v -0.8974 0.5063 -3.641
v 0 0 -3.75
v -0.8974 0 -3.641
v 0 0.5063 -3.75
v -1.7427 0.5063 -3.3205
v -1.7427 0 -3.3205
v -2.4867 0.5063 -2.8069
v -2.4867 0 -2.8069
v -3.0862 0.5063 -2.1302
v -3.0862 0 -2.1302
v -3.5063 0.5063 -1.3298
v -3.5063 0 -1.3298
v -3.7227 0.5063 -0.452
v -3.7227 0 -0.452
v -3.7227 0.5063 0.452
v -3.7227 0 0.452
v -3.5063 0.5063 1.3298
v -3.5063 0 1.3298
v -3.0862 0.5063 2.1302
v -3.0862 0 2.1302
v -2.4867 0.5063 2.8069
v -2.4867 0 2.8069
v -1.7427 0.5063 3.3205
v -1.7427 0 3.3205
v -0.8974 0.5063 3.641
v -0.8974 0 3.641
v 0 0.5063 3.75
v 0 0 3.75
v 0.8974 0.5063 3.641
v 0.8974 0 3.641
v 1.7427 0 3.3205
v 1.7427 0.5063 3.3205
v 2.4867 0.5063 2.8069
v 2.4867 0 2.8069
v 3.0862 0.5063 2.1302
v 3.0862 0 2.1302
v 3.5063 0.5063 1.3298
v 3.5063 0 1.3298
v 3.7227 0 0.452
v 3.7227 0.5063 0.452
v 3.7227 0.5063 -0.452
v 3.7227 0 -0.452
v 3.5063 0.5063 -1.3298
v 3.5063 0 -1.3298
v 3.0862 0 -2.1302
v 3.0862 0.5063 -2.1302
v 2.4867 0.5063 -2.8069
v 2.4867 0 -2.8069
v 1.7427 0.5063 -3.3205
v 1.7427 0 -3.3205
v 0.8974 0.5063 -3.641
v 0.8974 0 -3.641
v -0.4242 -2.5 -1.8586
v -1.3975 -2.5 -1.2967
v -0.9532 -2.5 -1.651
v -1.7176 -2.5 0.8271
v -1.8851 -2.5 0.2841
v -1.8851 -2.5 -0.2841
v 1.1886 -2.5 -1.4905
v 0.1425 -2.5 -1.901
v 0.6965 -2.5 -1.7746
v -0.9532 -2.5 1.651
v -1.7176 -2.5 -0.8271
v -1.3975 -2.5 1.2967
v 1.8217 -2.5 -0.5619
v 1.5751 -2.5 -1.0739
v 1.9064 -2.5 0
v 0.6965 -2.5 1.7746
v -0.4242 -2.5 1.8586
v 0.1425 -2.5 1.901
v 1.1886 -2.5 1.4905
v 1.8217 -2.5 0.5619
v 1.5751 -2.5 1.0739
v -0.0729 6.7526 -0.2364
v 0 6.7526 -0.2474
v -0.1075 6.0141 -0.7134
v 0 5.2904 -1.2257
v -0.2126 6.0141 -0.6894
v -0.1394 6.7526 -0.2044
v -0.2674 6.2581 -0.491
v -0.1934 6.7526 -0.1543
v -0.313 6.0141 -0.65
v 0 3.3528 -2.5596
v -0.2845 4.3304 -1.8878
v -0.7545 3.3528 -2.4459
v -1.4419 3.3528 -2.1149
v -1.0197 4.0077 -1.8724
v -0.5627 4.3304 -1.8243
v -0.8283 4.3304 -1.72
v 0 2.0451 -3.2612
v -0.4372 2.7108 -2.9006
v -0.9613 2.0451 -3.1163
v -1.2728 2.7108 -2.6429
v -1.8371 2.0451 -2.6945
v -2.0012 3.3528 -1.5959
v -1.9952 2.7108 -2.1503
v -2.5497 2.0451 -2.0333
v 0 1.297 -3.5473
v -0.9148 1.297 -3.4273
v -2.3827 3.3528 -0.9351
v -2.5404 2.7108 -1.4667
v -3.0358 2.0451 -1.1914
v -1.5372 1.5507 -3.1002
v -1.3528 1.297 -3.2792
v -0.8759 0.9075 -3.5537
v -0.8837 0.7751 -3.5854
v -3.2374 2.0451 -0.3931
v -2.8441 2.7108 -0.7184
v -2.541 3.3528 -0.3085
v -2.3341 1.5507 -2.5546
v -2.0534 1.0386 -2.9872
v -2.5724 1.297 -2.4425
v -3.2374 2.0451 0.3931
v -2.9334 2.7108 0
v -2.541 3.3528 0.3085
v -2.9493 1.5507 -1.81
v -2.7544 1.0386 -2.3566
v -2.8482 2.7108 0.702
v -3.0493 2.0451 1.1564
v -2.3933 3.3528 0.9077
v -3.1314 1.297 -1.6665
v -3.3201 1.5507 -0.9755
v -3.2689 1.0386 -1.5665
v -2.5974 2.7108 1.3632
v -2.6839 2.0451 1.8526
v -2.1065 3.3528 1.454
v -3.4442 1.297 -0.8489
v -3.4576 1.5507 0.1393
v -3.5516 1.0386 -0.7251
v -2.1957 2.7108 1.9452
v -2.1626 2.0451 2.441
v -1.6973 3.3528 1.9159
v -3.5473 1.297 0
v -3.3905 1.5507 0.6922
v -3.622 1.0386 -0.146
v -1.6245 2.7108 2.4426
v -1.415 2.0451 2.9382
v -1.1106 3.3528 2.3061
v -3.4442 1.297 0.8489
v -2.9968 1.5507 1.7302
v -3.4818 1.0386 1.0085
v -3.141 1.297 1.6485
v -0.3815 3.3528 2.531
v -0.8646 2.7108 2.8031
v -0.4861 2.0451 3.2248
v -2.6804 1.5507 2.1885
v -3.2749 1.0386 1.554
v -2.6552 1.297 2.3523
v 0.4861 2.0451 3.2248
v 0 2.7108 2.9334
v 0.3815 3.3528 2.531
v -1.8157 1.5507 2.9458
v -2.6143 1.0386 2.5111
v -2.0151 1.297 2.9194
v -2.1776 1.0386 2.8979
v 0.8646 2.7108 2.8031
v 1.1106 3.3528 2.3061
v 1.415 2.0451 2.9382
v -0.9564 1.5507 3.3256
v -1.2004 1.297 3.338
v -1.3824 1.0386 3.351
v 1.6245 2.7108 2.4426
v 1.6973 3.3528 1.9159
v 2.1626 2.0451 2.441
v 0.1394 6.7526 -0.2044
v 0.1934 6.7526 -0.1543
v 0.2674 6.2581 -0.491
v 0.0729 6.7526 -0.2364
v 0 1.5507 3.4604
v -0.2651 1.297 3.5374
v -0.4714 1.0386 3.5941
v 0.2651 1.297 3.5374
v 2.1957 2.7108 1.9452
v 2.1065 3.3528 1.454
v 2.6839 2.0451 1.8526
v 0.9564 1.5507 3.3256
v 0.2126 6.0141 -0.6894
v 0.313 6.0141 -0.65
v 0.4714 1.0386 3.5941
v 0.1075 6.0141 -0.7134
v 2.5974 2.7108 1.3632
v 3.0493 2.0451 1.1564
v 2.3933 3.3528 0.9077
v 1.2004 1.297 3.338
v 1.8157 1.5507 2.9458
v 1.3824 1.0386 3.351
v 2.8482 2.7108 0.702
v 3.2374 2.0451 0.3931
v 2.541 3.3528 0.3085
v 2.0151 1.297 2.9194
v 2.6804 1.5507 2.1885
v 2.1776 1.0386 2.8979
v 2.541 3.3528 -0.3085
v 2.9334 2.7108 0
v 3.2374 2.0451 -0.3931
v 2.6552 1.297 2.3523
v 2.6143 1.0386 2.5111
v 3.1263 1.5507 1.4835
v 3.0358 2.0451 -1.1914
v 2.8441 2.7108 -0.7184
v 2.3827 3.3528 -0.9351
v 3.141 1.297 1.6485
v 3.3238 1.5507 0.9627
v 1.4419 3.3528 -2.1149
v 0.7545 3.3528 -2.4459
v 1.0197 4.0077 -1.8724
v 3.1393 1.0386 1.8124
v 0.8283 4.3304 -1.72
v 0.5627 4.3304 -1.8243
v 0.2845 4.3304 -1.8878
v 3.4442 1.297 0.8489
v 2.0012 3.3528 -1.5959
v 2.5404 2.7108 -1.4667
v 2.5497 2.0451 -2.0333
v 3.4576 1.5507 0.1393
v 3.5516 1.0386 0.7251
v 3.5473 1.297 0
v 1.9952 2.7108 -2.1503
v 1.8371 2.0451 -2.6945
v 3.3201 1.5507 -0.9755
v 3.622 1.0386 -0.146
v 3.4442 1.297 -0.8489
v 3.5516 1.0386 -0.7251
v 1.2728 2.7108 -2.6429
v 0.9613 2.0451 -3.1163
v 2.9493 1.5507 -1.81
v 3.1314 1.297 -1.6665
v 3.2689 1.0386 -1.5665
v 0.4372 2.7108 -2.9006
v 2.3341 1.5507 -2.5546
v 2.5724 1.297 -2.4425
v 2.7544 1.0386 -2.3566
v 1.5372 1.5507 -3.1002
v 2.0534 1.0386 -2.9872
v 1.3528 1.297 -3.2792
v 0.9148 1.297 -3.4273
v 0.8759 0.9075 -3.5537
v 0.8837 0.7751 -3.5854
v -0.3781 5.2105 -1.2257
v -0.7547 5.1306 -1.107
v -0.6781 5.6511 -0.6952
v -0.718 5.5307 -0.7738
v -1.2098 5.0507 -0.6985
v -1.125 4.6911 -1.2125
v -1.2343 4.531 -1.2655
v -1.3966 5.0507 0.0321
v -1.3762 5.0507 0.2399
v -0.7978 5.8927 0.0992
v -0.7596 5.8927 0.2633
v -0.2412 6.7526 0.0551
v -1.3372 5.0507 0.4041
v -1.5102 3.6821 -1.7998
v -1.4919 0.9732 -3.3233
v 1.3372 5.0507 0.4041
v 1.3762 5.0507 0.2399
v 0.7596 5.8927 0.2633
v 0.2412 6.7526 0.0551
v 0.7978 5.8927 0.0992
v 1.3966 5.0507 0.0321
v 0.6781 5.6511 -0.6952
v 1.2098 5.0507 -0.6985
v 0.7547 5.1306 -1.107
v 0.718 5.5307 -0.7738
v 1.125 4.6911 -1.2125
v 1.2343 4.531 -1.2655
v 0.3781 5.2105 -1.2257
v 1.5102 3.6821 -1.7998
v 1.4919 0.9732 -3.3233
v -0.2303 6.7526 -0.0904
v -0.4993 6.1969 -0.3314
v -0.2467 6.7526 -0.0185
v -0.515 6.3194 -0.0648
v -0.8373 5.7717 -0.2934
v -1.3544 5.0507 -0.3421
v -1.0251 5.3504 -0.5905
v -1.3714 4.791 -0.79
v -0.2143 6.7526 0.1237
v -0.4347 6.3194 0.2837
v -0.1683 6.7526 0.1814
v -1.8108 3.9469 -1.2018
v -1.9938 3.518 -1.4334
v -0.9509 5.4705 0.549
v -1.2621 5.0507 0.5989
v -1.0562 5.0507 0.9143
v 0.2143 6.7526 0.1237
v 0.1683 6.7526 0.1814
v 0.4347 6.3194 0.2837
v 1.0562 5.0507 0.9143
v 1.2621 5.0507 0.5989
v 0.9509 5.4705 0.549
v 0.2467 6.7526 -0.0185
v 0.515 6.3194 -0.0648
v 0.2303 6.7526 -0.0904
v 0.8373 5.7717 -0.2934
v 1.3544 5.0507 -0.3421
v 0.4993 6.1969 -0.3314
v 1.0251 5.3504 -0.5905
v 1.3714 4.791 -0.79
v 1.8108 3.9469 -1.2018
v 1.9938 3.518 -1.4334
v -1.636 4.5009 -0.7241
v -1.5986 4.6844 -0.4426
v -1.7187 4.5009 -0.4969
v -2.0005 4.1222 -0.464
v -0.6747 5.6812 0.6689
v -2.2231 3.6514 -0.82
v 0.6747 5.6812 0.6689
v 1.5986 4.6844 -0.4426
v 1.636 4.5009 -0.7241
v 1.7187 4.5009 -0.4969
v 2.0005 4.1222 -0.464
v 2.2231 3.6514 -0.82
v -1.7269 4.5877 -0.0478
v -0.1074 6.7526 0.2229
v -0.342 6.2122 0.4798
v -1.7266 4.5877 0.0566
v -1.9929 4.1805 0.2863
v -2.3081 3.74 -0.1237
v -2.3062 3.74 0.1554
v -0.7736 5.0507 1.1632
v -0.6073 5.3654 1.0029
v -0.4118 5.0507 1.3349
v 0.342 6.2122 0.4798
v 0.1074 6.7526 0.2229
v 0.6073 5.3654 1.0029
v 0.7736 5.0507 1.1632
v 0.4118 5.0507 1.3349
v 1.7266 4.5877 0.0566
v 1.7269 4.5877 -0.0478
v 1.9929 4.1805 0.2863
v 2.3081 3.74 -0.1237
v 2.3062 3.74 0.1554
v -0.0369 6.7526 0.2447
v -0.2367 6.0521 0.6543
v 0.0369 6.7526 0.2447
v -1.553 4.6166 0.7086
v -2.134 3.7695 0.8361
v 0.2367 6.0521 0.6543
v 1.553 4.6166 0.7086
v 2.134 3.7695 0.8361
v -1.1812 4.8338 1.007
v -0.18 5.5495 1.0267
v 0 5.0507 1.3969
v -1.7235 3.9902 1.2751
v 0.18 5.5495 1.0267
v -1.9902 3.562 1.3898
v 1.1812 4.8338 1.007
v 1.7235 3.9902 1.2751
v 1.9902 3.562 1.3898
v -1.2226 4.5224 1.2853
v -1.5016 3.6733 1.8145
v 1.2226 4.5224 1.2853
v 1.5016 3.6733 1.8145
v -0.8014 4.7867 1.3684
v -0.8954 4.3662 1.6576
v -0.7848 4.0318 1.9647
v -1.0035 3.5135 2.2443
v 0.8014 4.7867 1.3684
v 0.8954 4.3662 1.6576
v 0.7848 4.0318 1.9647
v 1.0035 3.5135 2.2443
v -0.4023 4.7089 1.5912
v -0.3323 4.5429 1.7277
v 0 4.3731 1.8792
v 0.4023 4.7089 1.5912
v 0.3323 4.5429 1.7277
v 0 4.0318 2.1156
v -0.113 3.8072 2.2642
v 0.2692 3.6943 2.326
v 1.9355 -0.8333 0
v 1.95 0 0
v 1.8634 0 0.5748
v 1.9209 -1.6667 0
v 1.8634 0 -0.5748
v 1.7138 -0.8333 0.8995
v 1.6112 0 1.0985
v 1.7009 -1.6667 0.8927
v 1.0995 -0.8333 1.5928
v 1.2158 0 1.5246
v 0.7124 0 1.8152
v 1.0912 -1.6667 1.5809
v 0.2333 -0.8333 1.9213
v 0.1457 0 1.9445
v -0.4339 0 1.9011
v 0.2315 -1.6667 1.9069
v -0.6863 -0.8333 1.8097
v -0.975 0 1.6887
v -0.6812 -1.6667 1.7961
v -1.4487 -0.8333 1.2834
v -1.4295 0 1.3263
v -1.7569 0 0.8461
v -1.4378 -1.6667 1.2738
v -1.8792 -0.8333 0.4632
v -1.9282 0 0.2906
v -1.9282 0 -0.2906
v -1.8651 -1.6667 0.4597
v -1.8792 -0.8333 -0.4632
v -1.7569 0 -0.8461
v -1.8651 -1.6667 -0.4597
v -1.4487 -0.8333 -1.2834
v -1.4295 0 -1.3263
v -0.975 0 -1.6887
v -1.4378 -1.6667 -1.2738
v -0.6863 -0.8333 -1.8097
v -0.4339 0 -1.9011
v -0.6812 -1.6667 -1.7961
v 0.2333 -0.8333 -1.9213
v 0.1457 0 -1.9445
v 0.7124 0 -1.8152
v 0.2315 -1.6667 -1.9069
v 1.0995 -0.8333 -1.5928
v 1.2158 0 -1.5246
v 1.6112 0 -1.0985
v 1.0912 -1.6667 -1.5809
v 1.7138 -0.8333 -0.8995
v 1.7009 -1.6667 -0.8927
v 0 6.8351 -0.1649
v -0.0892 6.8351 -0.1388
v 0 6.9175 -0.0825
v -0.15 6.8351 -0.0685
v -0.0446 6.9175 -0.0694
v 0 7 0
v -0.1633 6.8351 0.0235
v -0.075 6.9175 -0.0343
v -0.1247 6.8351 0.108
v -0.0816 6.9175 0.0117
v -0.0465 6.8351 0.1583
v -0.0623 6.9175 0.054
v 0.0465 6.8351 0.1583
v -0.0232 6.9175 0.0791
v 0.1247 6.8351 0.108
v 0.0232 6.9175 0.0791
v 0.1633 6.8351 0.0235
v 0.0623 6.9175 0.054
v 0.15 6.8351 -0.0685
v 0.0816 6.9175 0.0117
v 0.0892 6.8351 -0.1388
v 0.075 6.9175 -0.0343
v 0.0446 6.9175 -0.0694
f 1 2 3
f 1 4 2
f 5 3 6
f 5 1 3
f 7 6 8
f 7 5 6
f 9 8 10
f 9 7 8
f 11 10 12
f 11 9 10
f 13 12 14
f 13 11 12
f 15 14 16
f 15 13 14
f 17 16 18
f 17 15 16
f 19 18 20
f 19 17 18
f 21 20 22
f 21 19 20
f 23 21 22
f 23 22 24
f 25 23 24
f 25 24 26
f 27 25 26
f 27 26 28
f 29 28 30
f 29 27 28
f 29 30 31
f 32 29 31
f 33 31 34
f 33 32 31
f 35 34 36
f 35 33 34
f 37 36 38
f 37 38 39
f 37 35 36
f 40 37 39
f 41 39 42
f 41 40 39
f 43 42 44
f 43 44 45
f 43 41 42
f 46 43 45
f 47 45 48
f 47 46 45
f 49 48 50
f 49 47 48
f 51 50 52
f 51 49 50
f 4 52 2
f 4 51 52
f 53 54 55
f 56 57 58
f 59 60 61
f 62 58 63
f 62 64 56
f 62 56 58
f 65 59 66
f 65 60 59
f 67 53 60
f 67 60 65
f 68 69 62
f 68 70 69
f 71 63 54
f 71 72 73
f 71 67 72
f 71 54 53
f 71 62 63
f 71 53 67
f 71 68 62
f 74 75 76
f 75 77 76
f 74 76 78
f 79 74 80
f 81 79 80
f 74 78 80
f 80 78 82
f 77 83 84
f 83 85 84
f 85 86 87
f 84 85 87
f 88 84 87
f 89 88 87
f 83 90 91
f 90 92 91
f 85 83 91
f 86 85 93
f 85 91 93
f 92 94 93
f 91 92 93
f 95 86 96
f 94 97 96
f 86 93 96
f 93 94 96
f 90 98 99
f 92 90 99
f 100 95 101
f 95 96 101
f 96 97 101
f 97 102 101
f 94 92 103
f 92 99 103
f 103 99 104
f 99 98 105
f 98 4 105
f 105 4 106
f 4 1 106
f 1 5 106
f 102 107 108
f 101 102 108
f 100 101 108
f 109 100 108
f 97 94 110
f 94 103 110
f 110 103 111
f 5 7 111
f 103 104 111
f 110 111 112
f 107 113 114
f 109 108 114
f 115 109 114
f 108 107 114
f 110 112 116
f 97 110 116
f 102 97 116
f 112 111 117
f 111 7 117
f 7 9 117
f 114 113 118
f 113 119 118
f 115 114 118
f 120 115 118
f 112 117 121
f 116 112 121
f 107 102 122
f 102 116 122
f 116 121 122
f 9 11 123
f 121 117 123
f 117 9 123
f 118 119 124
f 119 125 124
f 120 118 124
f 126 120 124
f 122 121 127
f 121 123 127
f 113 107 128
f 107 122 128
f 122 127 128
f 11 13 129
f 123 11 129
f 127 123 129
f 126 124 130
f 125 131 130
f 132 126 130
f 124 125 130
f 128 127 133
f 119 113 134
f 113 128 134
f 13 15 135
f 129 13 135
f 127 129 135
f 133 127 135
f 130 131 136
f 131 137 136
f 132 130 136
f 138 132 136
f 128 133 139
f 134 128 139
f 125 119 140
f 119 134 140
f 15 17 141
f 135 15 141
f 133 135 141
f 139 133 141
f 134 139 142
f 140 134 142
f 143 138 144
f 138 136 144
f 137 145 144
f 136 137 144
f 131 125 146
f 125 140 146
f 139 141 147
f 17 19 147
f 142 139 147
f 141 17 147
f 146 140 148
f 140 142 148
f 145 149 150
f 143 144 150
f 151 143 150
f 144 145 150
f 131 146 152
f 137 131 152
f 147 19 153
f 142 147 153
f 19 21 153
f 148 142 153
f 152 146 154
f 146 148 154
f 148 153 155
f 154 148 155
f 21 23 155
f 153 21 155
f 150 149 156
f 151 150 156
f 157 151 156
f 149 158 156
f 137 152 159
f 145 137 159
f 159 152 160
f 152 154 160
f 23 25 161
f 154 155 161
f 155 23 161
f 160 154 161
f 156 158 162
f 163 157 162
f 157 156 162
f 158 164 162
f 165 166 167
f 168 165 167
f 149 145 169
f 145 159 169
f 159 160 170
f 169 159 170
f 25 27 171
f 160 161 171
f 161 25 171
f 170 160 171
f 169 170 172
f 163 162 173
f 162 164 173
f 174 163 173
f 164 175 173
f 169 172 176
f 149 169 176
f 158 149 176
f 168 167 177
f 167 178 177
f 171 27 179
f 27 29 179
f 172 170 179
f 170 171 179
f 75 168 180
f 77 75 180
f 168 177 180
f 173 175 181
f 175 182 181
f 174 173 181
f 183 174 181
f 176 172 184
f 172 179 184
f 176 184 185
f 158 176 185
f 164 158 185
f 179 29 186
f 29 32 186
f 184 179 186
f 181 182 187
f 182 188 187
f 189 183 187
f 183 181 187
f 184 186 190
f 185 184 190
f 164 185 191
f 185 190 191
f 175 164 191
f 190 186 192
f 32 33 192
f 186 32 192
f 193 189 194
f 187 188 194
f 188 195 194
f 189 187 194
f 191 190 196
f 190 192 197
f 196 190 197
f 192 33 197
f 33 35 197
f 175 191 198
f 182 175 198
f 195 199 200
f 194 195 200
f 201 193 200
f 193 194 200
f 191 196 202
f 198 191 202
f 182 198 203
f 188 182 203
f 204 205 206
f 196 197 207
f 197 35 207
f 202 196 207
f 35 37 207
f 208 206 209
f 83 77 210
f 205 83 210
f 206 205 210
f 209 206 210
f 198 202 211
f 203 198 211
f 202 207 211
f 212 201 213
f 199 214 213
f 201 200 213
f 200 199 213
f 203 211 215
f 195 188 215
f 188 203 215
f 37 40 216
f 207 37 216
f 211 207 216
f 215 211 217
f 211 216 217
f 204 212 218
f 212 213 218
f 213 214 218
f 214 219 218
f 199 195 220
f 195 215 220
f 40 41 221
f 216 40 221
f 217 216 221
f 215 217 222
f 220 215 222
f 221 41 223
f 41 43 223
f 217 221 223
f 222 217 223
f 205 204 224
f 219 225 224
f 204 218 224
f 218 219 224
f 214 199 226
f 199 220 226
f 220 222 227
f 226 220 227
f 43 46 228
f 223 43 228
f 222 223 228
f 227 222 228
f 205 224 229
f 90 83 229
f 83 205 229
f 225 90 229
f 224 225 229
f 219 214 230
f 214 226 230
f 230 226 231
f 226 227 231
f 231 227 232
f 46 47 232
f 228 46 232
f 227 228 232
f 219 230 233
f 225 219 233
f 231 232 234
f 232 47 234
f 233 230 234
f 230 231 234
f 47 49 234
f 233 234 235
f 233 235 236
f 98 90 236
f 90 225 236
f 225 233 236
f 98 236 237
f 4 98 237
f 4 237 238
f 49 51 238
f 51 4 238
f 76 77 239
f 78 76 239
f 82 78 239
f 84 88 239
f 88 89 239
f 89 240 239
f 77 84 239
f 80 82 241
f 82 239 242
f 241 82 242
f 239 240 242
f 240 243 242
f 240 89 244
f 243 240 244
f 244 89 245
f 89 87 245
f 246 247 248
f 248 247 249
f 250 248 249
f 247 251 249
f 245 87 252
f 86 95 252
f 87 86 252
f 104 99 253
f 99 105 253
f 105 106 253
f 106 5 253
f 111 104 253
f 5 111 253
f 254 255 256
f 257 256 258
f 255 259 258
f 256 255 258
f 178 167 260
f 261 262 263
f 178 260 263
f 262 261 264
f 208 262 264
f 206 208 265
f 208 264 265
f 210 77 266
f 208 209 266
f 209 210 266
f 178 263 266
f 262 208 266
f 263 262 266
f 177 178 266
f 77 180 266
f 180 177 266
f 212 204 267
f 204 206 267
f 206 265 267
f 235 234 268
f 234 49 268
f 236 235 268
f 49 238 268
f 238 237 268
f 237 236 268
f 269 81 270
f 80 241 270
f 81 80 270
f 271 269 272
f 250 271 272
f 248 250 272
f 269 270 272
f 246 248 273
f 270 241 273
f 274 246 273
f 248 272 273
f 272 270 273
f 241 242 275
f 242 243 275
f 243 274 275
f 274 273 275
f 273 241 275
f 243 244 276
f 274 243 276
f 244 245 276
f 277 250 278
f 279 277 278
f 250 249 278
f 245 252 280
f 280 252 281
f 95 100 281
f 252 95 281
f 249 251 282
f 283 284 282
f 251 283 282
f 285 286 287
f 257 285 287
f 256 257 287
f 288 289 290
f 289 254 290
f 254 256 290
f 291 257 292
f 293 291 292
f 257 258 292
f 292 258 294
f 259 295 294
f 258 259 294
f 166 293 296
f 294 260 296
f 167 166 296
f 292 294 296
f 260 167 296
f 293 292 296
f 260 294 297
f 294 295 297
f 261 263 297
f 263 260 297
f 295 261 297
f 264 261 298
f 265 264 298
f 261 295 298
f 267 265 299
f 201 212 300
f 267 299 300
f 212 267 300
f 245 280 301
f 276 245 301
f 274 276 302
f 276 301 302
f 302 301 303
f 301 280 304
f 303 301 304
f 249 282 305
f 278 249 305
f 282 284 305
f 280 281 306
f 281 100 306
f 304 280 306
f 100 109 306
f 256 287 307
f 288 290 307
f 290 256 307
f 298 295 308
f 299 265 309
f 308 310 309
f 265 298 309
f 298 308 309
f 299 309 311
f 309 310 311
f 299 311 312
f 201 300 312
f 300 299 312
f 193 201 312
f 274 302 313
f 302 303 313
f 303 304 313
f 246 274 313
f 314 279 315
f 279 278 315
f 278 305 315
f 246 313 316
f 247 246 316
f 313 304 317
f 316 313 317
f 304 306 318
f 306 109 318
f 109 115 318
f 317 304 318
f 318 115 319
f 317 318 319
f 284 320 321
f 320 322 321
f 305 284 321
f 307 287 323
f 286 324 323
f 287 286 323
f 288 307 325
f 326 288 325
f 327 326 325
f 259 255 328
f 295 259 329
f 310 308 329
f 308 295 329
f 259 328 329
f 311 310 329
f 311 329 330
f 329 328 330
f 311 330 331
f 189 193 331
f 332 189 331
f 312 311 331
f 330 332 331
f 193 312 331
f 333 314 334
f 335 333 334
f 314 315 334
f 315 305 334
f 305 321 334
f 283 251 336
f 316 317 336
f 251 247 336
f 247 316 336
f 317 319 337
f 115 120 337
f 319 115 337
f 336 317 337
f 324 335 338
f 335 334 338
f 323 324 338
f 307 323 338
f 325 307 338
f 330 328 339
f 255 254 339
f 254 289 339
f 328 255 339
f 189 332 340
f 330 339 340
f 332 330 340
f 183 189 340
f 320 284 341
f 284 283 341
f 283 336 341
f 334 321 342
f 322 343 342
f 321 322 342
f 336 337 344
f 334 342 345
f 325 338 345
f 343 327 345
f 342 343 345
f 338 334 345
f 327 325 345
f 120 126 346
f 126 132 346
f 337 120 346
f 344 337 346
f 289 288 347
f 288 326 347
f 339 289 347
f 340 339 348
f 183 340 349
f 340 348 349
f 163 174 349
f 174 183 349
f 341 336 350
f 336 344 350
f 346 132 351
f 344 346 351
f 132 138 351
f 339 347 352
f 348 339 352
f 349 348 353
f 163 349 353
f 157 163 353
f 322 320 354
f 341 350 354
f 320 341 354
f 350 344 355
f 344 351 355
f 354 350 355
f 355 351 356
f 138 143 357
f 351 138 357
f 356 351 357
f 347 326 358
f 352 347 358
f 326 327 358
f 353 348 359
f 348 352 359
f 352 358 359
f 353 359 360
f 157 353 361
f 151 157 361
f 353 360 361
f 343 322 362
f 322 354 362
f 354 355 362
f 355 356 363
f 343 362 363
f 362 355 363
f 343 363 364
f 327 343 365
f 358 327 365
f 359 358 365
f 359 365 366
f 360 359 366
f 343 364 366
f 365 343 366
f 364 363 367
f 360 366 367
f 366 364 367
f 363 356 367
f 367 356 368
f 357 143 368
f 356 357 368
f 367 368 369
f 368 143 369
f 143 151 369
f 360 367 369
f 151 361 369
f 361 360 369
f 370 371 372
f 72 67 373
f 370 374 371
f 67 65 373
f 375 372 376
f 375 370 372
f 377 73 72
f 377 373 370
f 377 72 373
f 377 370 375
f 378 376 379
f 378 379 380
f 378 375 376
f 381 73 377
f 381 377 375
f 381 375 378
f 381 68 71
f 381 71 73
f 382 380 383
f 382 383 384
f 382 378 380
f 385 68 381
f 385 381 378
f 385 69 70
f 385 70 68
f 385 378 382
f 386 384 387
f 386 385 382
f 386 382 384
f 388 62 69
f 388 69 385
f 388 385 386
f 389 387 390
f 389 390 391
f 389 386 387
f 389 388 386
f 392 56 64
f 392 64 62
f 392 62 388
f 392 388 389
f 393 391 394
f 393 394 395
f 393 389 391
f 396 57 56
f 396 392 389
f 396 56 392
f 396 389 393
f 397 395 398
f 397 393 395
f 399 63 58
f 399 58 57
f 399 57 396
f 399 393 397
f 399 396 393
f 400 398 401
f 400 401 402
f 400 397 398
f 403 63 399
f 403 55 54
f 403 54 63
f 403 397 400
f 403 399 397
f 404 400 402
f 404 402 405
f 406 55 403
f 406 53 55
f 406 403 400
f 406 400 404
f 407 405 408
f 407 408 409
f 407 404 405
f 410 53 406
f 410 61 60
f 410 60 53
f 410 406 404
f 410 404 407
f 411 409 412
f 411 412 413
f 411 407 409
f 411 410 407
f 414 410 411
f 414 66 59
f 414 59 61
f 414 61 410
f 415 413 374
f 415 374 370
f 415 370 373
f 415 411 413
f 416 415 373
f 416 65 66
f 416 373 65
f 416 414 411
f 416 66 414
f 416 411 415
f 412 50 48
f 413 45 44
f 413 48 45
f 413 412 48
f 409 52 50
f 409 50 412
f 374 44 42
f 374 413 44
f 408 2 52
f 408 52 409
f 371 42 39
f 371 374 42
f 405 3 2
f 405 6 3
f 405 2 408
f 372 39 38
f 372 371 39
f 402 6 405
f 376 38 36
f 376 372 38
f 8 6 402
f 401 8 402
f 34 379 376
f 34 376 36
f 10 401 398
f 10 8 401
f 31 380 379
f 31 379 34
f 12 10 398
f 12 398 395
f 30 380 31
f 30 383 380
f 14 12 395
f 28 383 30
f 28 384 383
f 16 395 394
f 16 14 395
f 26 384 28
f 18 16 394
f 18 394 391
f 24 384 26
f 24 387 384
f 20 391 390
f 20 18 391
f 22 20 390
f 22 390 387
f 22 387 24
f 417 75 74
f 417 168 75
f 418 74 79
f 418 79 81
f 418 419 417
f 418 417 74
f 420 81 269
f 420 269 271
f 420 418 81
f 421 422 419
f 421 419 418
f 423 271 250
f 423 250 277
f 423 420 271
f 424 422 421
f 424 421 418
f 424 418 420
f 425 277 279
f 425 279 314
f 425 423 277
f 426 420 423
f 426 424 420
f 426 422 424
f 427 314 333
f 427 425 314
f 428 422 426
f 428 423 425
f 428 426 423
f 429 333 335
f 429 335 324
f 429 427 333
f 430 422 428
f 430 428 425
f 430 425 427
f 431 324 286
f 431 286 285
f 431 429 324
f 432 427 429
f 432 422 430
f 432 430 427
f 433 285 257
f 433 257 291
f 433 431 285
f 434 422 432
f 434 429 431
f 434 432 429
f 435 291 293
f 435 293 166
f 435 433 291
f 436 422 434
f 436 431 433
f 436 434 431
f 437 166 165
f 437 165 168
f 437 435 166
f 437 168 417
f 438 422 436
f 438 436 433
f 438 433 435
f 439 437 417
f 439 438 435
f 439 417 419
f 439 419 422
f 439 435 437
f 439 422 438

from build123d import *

# Parameters (mm, degrees)
SKETCH2_R           = 2.1
CUT_EXTRUDE1_DEPTH  = 2
SKETCH4_R           = 1.95
BOSS_EXTRUDE2_DEPTH = 2.5
BOSS_EXTRUDE2_TAPER = 1


with BuildPart() as part:
    # Sketch1 → Revolve1 (revolve)
    with BuildSketch(Plane.XY, mode=Mode.PRIVATE) as revolve1_sk:
        with BuildLine():
            Line((0, -2), (-2, -2))
            Line((-2, -2), (-2, 0))
            Line((-2, 0), (-3.75, 0))
            Line((-3.75, 0), (-3.75, 0.506327417))
            add(Edge.make_bspline(
                [(-0.247423506, 6.752576494), (-1.479776467, 4.708862861), (-3.282918319, 2.94887927), (-3.75, 0.506327417)],
                knots=[0, 0, 0, 0, 1, 1, 1, 1], degree=3))
            Line((-0.247423506, 6.752576494), (0, 7))
            Line((0, 7), (0, -2))
        make_face()
    revolve(revolve1_sk.sketch.rotate(Axis((0, -2, 0), (0, 1, 0)), 270), axis=Axis((0, -2, 0), (0, 1, 0)))

    # Sketch2 → Cut-Extrude1 (cut)
    with BuildSketch(Plane.XZ.offset(2)):
        Circle(SKETCH2_R)
    extrude(amount=-CUT_EXTRUDE1_DEPTH, mode=Mode.SUBTRACT)

    # Sketch4 → Boss-Extrude2 (add)
    with BuildSketch(Plane.XZ):
        Circle(SKETCH4_R)
    extrude(amount=BOSS_EXTRUDE2_DEPTH, taper=BOSS_EXTRUDE2_TAPER)


solid = part.part
